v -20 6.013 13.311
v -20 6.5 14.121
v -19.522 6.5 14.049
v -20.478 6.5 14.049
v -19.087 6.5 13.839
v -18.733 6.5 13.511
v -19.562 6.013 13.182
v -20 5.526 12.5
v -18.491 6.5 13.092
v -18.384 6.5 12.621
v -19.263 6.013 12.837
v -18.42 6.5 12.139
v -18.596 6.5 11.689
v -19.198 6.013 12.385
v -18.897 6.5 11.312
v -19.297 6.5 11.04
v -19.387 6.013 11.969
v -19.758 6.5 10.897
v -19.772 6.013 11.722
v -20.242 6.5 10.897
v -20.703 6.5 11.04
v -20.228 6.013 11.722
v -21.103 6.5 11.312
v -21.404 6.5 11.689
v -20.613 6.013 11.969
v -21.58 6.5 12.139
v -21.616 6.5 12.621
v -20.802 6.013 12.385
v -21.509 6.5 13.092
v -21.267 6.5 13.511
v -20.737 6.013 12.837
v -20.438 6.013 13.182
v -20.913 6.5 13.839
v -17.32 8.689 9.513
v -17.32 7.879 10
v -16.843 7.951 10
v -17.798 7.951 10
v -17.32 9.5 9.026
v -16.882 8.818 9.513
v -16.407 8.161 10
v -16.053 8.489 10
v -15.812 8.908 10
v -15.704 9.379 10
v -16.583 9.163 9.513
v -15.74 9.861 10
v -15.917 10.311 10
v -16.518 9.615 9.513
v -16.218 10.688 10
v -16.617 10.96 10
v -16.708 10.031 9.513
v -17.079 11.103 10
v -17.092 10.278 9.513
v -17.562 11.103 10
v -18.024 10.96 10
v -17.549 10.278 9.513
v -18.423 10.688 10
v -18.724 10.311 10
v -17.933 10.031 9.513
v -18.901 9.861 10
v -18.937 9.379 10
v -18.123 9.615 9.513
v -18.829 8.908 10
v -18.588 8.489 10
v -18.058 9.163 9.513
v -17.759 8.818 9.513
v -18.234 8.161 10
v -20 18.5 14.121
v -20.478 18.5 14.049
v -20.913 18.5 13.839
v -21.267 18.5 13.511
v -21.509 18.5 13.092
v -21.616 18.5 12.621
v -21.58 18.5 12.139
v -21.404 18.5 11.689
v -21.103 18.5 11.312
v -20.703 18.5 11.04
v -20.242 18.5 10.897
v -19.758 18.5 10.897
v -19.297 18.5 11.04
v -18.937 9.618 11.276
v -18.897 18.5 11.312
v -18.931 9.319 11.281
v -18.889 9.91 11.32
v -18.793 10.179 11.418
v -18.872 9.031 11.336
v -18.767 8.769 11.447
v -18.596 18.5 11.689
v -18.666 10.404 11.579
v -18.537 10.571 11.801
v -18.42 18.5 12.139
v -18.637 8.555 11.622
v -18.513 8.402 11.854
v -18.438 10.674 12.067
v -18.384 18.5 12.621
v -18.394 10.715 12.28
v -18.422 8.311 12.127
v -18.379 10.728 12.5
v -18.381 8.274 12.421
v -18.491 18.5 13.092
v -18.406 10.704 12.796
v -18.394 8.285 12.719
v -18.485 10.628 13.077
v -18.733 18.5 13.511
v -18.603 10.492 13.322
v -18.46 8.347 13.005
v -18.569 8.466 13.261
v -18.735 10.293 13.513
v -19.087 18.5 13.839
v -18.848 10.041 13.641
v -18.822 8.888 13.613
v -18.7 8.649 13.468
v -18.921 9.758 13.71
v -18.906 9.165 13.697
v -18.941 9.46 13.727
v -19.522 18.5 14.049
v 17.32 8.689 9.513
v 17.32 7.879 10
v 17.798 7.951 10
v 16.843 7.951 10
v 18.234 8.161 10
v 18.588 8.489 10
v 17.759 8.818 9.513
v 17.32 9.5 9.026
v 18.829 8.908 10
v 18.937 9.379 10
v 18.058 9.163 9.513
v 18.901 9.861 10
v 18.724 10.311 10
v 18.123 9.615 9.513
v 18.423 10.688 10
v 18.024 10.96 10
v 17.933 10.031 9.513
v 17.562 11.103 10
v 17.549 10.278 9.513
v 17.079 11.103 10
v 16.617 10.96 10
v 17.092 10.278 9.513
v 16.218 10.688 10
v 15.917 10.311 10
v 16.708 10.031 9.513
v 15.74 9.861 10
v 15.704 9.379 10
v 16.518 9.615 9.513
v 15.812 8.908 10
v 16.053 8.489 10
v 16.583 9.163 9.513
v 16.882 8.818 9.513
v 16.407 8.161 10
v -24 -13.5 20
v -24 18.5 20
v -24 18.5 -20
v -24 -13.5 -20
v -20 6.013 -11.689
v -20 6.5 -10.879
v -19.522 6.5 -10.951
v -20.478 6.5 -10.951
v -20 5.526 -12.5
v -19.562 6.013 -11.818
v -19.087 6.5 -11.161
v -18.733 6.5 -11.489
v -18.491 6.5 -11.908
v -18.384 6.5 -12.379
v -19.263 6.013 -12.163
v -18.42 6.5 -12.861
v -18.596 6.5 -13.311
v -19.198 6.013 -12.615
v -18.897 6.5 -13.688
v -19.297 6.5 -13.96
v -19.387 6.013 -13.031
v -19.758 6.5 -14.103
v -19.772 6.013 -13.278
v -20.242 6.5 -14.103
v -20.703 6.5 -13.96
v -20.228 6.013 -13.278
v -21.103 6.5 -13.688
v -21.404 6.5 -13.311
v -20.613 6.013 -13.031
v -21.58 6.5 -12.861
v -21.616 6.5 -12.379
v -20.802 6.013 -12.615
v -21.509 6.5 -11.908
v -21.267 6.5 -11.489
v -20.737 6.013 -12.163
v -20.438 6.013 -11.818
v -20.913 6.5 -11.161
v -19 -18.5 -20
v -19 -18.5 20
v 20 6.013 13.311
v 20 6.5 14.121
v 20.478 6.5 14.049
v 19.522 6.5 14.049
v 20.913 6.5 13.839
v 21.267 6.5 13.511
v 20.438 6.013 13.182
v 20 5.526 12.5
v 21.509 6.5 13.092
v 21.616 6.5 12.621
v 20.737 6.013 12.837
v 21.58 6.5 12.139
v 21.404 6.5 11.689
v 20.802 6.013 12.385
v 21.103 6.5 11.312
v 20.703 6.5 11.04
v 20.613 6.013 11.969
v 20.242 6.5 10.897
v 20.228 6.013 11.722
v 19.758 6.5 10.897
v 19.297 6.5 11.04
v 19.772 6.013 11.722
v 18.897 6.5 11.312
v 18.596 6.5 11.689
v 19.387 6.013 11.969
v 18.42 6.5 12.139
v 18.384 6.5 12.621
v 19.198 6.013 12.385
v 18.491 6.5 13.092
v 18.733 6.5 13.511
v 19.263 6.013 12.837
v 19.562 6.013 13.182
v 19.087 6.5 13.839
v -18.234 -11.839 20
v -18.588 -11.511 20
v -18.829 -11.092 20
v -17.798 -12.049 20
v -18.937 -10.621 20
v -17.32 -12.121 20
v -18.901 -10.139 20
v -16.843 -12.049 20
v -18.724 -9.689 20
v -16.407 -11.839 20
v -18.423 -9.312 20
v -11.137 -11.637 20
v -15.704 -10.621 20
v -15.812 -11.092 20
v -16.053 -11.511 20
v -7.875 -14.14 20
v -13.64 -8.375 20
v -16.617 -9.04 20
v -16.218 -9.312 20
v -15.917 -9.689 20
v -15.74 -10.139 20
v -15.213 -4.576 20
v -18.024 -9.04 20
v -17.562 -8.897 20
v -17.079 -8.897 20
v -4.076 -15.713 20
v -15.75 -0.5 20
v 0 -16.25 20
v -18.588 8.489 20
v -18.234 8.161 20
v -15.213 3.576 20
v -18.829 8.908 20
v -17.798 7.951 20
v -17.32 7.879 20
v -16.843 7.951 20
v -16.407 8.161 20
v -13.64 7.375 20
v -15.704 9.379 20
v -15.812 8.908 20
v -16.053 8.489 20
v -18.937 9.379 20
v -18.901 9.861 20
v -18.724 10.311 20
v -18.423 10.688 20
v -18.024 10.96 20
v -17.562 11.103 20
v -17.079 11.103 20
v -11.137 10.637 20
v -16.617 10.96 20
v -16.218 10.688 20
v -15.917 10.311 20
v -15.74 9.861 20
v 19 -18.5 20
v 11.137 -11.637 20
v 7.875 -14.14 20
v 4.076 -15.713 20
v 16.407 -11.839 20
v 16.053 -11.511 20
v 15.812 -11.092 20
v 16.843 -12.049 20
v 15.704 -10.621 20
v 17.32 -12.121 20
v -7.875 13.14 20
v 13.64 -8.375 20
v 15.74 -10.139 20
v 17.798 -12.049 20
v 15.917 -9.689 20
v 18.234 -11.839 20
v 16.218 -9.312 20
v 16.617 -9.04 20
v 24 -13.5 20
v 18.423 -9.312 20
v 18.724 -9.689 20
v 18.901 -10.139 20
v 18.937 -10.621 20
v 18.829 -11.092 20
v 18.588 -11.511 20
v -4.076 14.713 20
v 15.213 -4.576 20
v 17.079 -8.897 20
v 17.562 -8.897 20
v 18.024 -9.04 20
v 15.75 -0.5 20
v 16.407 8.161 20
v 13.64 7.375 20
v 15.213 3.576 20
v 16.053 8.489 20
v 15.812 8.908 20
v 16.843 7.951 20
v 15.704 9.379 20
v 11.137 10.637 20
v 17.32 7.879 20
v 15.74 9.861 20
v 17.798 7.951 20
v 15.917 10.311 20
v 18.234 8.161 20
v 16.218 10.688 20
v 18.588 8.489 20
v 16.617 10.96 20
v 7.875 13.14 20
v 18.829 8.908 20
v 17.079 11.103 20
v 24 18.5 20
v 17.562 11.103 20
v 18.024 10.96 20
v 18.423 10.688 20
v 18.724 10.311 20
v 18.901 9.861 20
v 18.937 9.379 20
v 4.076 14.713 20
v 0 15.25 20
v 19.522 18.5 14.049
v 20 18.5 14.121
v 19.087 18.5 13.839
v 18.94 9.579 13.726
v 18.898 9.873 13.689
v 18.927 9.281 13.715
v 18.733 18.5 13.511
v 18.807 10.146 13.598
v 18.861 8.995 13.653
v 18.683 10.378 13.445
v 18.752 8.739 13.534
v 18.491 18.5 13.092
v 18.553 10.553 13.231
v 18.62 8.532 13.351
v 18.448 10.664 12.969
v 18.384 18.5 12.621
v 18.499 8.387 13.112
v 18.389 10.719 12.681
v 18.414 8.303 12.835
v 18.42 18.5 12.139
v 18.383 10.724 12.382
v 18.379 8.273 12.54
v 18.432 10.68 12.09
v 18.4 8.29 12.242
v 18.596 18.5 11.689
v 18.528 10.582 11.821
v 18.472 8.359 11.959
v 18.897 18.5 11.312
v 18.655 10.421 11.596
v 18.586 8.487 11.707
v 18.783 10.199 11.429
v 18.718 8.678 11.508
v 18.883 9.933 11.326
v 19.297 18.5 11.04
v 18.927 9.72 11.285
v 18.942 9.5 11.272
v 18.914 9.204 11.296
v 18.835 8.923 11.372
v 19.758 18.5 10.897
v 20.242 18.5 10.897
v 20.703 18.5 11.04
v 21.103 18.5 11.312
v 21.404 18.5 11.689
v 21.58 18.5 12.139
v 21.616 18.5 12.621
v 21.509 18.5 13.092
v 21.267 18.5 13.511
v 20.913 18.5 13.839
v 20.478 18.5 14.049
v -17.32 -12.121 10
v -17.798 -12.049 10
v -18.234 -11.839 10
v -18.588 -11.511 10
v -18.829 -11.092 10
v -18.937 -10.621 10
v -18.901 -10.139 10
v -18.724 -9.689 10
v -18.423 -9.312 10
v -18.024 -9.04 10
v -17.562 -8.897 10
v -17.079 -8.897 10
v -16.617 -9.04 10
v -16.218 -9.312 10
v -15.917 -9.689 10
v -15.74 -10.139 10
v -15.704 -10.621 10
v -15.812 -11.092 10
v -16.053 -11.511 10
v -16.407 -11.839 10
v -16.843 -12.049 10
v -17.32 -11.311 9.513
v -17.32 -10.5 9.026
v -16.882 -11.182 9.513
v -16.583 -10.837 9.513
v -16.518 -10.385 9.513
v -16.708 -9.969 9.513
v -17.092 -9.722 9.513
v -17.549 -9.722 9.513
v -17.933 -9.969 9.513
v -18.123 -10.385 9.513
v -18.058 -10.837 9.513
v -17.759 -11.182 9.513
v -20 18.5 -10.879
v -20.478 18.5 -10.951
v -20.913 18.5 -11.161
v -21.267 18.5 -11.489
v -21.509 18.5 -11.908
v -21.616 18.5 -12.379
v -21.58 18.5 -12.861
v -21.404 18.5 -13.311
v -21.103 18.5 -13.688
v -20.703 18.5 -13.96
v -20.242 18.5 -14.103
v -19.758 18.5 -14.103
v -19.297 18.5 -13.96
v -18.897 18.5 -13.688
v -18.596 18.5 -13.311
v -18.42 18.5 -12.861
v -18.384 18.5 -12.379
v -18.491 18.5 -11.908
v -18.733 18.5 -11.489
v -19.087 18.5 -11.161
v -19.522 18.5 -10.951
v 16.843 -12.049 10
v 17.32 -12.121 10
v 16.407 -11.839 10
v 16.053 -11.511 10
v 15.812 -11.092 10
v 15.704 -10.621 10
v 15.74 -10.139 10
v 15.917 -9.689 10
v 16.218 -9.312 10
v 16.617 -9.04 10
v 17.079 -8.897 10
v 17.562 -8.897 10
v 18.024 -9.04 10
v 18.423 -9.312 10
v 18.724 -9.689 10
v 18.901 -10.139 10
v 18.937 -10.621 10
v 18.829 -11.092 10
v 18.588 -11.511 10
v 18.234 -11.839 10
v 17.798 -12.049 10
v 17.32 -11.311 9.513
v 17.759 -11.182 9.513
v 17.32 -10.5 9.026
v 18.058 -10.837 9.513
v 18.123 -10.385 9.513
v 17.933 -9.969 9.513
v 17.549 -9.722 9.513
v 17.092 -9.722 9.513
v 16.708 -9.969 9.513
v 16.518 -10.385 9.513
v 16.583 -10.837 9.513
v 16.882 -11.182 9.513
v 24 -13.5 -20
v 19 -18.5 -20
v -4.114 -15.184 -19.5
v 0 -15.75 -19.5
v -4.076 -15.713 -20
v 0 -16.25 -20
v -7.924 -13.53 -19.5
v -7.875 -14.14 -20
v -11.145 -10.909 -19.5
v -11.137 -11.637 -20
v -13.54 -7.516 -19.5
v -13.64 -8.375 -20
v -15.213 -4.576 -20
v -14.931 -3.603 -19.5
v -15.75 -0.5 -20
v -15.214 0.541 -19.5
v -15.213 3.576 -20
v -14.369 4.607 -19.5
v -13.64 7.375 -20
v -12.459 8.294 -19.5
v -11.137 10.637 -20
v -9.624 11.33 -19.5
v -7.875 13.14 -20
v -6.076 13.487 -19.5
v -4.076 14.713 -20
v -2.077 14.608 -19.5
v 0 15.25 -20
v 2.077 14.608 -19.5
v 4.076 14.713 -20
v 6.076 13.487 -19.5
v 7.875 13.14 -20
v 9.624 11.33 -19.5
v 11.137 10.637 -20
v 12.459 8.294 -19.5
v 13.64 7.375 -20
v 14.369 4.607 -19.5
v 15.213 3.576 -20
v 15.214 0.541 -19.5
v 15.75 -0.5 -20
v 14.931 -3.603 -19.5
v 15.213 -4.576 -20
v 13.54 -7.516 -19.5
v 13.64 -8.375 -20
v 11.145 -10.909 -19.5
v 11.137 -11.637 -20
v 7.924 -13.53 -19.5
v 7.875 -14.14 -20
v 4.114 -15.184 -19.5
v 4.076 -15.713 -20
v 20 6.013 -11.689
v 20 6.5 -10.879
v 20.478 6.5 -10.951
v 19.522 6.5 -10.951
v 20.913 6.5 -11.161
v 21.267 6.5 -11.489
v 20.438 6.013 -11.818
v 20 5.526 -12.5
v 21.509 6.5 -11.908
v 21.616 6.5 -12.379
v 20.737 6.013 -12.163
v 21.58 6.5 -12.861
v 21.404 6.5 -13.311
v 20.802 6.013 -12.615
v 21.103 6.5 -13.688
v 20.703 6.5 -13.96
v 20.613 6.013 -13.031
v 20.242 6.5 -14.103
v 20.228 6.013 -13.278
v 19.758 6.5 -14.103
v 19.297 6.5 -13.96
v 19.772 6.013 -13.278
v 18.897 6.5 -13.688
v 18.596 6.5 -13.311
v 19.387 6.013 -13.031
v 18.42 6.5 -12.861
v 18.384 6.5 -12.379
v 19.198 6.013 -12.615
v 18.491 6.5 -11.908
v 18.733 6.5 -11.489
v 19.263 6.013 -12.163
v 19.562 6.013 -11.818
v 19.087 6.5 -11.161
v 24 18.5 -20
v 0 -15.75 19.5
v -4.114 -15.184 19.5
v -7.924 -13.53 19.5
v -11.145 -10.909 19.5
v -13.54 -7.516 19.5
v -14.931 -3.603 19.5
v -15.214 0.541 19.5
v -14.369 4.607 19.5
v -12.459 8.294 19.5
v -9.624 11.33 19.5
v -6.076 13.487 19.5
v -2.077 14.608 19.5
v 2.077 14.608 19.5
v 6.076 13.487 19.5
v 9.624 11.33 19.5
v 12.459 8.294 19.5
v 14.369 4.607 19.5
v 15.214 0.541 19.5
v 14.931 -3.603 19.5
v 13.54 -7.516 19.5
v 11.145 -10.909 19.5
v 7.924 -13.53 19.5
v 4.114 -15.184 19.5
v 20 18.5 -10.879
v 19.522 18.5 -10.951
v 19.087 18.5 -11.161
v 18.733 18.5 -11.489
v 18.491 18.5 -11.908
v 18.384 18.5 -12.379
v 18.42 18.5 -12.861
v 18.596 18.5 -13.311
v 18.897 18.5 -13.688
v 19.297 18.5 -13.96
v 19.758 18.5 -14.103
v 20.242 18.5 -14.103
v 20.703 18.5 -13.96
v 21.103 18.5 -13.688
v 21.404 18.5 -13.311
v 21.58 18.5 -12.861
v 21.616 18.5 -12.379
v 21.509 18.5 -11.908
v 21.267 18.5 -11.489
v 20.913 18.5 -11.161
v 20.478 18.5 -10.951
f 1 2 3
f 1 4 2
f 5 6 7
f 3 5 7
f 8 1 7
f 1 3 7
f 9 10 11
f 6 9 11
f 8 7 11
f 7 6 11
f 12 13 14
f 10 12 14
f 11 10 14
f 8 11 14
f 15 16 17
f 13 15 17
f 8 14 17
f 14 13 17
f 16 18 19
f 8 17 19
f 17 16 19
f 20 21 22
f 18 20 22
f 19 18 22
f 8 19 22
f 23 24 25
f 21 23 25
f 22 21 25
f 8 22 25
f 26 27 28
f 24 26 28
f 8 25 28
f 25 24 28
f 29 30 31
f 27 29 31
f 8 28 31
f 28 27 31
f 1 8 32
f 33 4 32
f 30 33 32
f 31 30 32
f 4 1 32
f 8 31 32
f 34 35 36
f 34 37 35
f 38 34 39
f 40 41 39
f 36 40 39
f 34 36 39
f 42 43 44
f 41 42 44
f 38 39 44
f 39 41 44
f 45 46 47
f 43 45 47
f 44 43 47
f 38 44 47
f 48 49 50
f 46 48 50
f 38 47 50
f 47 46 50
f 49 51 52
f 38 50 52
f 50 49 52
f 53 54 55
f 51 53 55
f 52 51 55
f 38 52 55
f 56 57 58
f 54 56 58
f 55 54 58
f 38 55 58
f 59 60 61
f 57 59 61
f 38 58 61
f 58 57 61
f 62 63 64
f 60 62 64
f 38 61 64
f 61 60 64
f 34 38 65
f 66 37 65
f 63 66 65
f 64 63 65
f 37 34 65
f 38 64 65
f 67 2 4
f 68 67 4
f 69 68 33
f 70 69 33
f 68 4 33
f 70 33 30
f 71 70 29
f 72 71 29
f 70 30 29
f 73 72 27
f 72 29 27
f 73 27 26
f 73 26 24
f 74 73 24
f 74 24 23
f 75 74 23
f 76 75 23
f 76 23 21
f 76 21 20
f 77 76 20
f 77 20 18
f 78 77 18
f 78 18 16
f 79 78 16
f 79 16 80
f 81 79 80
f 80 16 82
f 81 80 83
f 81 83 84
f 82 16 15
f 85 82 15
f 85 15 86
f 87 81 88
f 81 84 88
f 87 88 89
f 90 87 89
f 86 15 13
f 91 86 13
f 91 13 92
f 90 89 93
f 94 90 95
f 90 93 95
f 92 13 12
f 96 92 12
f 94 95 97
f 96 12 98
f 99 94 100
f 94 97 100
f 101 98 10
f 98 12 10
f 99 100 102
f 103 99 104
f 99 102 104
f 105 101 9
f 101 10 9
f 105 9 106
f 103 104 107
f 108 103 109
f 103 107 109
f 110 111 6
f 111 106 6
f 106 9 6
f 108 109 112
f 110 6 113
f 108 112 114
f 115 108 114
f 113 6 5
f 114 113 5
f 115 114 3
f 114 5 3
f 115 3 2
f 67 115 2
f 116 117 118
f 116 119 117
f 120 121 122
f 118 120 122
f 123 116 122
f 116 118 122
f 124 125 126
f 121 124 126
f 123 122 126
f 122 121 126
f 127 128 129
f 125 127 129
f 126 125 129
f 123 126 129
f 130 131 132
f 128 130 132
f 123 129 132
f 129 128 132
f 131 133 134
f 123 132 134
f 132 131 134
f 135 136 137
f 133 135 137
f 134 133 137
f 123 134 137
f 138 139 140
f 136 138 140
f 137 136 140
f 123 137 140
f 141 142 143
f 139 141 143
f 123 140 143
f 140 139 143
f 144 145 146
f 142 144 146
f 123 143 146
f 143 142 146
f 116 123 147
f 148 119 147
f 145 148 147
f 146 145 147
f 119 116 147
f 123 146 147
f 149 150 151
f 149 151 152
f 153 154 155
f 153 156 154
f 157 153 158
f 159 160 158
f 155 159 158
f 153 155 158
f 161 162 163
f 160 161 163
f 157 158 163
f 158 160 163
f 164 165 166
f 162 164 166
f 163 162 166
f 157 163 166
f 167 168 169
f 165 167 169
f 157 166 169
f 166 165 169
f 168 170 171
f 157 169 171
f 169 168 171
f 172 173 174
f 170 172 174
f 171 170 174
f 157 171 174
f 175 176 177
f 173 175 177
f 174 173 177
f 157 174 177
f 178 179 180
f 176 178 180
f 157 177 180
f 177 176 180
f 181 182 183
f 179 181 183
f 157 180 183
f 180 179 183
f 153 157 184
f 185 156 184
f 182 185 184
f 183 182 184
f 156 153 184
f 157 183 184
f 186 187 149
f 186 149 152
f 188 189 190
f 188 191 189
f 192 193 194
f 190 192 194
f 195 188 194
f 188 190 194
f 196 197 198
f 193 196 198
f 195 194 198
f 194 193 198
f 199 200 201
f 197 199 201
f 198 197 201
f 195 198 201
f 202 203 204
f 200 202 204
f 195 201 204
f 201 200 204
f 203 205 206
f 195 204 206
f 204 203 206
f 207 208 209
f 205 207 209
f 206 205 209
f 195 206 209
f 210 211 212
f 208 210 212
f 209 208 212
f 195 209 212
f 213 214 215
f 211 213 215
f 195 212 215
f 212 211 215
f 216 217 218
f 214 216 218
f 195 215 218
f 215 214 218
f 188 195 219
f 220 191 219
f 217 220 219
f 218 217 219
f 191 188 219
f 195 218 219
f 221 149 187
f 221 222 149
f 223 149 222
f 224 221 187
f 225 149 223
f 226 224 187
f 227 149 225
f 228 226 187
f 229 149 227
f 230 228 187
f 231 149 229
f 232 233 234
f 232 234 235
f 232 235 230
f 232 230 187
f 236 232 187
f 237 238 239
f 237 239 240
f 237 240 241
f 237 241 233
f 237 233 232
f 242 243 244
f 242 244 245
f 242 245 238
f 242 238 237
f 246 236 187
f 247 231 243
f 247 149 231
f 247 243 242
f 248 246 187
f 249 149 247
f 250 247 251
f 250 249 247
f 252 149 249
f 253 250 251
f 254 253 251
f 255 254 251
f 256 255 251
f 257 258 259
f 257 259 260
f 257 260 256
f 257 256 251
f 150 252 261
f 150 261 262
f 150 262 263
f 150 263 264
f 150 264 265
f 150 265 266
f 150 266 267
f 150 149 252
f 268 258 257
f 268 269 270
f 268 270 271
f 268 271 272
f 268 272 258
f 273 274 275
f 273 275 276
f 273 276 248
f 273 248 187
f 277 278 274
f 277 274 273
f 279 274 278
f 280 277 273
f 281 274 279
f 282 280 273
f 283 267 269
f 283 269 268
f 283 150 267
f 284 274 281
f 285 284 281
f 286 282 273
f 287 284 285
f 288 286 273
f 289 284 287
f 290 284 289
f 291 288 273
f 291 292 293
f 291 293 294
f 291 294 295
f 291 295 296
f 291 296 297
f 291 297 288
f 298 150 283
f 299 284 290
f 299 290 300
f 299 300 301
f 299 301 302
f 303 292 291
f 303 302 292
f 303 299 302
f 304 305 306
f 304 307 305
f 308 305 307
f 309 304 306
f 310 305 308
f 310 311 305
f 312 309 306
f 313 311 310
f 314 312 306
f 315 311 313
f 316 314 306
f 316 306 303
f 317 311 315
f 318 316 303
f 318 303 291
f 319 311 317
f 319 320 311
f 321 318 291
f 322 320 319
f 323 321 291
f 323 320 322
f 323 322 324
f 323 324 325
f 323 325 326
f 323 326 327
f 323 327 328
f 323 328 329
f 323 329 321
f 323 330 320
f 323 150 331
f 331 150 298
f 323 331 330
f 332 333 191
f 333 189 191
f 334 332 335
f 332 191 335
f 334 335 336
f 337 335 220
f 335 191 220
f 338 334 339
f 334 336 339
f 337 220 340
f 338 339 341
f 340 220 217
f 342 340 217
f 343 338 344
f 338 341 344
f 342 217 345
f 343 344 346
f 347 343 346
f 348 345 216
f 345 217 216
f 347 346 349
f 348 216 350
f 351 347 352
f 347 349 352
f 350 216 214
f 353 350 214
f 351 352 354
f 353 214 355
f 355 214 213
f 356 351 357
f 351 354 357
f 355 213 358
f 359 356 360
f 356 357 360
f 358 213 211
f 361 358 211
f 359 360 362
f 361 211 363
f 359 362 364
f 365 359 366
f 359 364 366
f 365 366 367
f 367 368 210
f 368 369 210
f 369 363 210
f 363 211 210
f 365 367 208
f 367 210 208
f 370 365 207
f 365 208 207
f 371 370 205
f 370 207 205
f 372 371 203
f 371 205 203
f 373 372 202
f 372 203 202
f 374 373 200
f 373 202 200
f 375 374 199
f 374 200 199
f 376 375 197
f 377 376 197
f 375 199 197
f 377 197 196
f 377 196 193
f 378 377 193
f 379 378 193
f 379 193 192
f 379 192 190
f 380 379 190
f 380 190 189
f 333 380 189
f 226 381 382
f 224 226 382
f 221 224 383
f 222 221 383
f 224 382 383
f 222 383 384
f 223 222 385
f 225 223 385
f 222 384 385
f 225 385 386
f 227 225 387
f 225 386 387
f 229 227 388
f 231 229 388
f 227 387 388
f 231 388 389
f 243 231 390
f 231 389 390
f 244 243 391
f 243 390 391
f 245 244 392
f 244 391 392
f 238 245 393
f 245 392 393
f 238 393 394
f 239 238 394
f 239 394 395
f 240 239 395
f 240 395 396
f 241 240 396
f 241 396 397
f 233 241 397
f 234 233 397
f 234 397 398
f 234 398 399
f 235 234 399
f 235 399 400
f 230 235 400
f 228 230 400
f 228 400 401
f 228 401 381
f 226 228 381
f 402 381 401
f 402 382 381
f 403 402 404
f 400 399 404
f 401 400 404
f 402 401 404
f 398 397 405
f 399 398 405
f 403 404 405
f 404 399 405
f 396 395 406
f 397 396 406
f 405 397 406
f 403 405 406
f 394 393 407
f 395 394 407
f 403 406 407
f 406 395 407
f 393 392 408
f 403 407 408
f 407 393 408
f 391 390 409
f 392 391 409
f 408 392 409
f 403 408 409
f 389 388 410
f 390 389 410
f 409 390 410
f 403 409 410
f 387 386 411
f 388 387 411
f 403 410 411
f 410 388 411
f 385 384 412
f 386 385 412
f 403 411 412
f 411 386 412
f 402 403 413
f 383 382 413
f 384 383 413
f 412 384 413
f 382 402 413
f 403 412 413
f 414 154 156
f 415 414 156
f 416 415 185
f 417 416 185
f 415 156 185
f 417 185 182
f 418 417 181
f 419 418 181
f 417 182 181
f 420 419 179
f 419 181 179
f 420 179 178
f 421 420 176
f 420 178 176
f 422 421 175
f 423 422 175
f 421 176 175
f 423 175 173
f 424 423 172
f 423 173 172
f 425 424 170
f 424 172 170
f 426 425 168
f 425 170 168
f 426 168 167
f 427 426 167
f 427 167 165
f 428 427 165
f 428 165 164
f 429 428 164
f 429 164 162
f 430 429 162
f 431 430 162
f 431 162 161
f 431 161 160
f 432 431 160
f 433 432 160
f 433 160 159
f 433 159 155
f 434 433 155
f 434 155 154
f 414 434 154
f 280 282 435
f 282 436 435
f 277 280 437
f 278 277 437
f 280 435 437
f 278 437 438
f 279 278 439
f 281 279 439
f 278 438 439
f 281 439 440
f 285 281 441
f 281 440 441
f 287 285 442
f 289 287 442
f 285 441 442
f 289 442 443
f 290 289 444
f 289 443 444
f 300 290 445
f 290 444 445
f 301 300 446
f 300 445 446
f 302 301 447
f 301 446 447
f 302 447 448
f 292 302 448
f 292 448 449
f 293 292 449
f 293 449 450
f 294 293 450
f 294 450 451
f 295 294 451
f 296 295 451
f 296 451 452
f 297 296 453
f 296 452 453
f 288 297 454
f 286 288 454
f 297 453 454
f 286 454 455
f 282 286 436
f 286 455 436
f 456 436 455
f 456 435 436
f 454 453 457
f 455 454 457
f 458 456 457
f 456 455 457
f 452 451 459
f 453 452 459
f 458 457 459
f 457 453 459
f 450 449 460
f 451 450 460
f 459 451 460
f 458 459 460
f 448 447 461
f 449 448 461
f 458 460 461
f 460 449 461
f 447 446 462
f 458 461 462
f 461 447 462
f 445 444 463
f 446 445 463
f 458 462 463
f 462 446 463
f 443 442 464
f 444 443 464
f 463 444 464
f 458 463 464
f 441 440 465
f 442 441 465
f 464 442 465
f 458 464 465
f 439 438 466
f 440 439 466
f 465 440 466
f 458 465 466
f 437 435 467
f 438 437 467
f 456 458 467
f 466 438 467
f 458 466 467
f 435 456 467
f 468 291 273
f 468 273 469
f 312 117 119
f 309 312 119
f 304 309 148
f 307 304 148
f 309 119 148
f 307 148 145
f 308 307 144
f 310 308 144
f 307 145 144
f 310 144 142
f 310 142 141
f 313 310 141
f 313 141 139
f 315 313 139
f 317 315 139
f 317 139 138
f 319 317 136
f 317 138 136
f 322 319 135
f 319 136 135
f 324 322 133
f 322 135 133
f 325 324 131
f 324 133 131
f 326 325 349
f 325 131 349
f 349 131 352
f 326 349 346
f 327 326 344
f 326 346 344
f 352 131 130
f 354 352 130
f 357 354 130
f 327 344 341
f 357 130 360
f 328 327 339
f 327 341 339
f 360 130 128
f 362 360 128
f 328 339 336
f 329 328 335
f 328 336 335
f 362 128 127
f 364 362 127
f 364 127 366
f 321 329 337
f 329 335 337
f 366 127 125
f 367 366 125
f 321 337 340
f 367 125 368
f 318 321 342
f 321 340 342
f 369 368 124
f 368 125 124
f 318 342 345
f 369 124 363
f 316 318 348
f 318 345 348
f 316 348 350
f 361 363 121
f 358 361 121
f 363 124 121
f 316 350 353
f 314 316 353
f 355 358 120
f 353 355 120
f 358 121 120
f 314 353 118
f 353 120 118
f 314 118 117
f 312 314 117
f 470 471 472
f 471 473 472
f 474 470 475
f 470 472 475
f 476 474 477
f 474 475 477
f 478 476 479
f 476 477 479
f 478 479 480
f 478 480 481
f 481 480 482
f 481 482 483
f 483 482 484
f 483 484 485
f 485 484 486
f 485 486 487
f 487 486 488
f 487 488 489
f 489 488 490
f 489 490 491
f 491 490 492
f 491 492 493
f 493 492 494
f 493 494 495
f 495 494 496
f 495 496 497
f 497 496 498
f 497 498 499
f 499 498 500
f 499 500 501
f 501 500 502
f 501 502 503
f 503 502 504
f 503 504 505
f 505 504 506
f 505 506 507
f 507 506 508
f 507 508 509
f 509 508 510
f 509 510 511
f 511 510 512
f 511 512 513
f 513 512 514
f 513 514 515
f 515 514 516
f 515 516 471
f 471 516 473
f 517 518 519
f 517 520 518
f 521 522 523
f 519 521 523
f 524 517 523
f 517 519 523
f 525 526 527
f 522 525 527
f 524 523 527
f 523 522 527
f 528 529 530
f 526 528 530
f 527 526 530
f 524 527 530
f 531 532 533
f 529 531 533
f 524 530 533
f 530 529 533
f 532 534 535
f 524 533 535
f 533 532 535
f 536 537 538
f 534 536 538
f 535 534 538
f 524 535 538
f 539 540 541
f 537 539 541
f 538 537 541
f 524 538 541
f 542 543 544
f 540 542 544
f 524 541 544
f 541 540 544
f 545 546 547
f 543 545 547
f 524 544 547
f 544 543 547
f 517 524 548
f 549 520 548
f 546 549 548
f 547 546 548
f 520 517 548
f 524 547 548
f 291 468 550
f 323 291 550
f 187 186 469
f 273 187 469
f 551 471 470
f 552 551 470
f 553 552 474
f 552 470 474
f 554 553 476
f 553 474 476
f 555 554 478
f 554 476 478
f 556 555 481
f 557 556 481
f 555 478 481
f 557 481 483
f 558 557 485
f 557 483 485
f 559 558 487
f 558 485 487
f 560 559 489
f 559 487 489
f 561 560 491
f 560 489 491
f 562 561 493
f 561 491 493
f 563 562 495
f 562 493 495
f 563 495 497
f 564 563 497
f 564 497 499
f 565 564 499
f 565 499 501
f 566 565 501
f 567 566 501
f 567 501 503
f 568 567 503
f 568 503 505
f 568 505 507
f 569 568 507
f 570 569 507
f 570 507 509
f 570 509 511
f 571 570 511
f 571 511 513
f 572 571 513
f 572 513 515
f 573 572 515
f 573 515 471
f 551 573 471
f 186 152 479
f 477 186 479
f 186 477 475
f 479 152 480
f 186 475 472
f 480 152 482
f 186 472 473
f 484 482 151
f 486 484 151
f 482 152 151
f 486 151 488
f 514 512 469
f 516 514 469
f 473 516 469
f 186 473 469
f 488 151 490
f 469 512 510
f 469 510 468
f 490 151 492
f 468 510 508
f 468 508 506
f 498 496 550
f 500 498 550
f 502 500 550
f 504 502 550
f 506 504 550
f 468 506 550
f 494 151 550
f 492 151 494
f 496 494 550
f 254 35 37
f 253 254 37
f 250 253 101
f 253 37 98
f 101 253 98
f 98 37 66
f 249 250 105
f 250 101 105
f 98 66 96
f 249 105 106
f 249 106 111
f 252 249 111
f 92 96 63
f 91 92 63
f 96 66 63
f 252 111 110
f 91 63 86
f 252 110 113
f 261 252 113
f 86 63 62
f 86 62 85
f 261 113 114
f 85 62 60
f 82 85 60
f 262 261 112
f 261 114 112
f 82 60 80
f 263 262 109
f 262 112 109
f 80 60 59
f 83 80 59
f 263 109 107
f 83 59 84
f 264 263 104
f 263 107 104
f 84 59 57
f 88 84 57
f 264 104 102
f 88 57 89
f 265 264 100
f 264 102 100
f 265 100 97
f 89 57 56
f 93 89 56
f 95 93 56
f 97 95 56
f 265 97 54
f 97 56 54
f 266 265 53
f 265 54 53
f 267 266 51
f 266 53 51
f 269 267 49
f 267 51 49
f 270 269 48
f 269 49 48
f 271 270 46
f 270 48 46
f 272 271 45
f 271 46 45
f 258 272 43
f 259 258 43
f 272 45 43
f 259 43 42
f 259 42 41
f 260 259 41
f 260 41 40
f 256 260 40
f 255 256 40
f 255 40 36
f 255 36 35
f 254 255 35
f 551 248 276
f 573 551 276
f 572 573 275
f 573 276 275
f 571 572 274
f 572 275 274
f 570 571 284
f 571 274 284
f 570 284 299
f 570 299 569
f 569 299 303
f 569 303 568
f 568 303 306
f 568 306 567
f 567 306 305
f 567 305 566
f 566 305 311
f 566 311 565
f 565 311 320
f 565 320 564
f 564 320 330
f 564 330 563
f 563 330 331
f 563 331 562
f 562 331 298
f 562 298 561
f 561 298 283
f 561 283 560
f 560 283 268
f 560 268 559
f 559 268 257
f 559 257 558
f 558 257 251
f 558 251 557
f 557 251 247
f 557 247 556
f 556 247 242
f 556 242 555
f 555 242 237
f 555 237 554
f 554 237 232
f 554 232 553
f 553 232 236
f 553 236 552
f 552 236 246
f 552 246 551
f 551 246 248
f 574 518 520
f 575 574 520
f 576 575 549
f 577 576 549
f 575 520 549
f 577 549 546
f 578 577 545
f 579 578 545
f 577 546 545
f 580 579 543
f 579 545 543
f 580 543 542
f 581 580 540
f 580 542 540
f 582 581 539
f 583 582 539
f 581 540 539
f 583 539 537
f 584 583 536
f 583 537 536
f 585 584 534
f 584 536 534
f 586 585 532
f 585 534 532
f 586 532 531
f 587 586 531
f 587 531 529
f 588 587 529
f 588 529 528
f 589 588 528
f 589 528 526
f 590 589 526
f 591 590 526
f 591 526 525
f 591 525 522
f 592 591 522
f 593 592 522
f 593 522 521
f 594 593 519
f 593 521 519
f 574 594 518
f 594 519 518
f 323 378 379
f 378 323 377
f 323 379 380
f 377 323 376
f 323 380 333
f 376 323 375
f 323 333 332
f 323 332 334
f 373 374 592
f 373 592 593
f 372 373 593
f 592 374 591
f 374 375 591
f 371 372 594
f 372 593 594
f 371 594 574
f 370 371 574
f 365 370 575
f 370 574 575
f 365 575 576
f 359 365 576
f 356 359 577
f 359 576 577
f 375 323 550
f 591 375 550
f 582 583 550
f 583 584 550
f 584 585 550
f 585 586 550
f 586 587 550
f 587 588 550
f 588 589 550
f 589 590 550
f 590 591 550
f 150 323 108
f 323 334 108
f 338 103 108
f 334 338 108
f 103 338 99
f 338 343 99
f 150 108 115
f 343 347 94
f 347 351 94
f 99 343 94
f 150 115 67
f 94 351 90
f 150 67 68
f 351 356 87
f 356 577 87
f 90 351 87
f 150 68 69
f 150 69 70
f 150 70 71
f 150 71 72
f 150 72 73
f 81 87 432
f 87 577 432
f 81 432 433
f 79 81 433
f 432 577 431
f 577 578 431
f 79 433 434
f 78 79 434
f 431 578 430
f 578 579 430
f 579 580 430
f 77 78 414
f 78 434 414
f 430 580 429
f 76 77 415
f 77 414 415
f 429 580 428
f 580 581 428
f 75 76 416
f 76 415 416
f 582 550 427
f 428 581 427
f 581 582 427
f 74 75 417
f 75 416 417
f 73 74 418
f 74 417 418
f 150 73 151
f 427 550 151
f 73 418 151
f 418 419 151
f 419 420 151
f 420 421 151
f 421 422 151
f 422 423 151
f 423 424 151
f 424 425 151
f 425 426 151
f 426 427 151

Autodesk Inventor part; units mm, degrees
ref_plane "YZ Plane" through (0, 0, 0) normal (1, 0, 0) x (0, 1, 0)
ref_plane "XZ Plane" through (0, 0, 0) normal (0, 1, 0) x (-1, 0, 0)
ref_plane "XY Plane" through (0, 0, 0) normal (0, 0, 1) x (1, 0, 0)
sketch "Sketch1" plane through (0, 0, 0) normal (0, 0, 1) x (1, 0, 0)
  line L0 (-24, -18.5) -> (24, -18.5)
  line L1 (24, -18.5) -> (24, 18.5)
  line L2 (24, 18.5) -> (-24, 18.5)
  line L3 (-24, 18.5) -> (-24, -18.5)
  line L4 (-24, -18.5) -> (24, 18.5) construction
  line L5 (24, -18.5) -> (-24, 18.5) construction
  point P0 (0, 0)
  dimension "d0" = 48
  dimension "d1" = 37
extrude "Extrusion1" add sketch "Sketch1" along normal mid plane 40
chamfer "Chamfer1" distance 5 angle 45 2 edges at (24, -18.5, 0) (-24, -18.5, 0)
sketch "Sketch2" plane through (0, 0, 20) normal (0, 0, 1) x (1, 0, 0)
  line L0 (24, 18.5) -> (-24, 18.5) projected
  point P0 (0, 0)
  point P1 (0, -0.5)
  point P2 (0, 18.5)
  dimension "d7" = 19
hole "Hole1" at (0, -0.5, 20) direction (0, 0, -1) diameter 30.5 end through all
chamfer "Chamfer2" distance 0.5 angle 45 2 edges at (0, 14.75, 20) (0, 14.75, -20)
sketch "Sketch3" plane through (-24, 18.5, 20) normal (0, 1, 0) x (1, 0, 0)
  line L0 (44, 7.5) -> (4, 7.5)
  line L1 (4, 7.5) -> (4, 32.5)
  line L2 (4, 32.5) -> (44, 32.5)
  line L3 (44, 32.5) -> (44, 7.5)
  line L4 (44, 7.5) -> (4, 32.5) construction
  line L5 (4, 7.5) -> (44, 32.5) construction
  point P0 (24, 20)
  dimension "d18" = 25
  dimension "d19" = 40
hole "Hole2" at (-20, 18.5, -12.5) at (-20, 18.5, 12.5) at (20, 18.5, -12.5) at (20, 18.5, 12.5) direction (0, -1, 0) diameter 3.242 depth 12 tip angle 118 thread size "M4x0.7" designation "M4" class "6H" standard "ISO Metric profile"
sketch "Sketch4" plane through (0, 0, 20) normal (0, 0, 1) x (1, 0, 0)
  circle A0 centre (0, -0.5) radius 20 construction
  circle A1 centre (0, -0.5) radius 15.25 projected
  point P0 (0, 0)
  point P1 (-17.3205, 9.5)
  point P2 (-17.3205, -10.5)
  point P3 (17.3205, -10.5)
  point P4 (17.3205, 9.5)
  dimension "d27" = 20
  dimension "d28" = 40
hole "Hole4" at (-17.3205, 9.5, 20) at (-17.3205, -10.5, 20) at (17.3205, -10.5, 20) at (17.3205, 9.5, 20) direction (0, 0, -1) diameter 3.242 depth 10 tip angle 118 thread size "M4x0.7" class "6H" standard "ISO Metric profile"
properties part number "Ballnut_Support"
